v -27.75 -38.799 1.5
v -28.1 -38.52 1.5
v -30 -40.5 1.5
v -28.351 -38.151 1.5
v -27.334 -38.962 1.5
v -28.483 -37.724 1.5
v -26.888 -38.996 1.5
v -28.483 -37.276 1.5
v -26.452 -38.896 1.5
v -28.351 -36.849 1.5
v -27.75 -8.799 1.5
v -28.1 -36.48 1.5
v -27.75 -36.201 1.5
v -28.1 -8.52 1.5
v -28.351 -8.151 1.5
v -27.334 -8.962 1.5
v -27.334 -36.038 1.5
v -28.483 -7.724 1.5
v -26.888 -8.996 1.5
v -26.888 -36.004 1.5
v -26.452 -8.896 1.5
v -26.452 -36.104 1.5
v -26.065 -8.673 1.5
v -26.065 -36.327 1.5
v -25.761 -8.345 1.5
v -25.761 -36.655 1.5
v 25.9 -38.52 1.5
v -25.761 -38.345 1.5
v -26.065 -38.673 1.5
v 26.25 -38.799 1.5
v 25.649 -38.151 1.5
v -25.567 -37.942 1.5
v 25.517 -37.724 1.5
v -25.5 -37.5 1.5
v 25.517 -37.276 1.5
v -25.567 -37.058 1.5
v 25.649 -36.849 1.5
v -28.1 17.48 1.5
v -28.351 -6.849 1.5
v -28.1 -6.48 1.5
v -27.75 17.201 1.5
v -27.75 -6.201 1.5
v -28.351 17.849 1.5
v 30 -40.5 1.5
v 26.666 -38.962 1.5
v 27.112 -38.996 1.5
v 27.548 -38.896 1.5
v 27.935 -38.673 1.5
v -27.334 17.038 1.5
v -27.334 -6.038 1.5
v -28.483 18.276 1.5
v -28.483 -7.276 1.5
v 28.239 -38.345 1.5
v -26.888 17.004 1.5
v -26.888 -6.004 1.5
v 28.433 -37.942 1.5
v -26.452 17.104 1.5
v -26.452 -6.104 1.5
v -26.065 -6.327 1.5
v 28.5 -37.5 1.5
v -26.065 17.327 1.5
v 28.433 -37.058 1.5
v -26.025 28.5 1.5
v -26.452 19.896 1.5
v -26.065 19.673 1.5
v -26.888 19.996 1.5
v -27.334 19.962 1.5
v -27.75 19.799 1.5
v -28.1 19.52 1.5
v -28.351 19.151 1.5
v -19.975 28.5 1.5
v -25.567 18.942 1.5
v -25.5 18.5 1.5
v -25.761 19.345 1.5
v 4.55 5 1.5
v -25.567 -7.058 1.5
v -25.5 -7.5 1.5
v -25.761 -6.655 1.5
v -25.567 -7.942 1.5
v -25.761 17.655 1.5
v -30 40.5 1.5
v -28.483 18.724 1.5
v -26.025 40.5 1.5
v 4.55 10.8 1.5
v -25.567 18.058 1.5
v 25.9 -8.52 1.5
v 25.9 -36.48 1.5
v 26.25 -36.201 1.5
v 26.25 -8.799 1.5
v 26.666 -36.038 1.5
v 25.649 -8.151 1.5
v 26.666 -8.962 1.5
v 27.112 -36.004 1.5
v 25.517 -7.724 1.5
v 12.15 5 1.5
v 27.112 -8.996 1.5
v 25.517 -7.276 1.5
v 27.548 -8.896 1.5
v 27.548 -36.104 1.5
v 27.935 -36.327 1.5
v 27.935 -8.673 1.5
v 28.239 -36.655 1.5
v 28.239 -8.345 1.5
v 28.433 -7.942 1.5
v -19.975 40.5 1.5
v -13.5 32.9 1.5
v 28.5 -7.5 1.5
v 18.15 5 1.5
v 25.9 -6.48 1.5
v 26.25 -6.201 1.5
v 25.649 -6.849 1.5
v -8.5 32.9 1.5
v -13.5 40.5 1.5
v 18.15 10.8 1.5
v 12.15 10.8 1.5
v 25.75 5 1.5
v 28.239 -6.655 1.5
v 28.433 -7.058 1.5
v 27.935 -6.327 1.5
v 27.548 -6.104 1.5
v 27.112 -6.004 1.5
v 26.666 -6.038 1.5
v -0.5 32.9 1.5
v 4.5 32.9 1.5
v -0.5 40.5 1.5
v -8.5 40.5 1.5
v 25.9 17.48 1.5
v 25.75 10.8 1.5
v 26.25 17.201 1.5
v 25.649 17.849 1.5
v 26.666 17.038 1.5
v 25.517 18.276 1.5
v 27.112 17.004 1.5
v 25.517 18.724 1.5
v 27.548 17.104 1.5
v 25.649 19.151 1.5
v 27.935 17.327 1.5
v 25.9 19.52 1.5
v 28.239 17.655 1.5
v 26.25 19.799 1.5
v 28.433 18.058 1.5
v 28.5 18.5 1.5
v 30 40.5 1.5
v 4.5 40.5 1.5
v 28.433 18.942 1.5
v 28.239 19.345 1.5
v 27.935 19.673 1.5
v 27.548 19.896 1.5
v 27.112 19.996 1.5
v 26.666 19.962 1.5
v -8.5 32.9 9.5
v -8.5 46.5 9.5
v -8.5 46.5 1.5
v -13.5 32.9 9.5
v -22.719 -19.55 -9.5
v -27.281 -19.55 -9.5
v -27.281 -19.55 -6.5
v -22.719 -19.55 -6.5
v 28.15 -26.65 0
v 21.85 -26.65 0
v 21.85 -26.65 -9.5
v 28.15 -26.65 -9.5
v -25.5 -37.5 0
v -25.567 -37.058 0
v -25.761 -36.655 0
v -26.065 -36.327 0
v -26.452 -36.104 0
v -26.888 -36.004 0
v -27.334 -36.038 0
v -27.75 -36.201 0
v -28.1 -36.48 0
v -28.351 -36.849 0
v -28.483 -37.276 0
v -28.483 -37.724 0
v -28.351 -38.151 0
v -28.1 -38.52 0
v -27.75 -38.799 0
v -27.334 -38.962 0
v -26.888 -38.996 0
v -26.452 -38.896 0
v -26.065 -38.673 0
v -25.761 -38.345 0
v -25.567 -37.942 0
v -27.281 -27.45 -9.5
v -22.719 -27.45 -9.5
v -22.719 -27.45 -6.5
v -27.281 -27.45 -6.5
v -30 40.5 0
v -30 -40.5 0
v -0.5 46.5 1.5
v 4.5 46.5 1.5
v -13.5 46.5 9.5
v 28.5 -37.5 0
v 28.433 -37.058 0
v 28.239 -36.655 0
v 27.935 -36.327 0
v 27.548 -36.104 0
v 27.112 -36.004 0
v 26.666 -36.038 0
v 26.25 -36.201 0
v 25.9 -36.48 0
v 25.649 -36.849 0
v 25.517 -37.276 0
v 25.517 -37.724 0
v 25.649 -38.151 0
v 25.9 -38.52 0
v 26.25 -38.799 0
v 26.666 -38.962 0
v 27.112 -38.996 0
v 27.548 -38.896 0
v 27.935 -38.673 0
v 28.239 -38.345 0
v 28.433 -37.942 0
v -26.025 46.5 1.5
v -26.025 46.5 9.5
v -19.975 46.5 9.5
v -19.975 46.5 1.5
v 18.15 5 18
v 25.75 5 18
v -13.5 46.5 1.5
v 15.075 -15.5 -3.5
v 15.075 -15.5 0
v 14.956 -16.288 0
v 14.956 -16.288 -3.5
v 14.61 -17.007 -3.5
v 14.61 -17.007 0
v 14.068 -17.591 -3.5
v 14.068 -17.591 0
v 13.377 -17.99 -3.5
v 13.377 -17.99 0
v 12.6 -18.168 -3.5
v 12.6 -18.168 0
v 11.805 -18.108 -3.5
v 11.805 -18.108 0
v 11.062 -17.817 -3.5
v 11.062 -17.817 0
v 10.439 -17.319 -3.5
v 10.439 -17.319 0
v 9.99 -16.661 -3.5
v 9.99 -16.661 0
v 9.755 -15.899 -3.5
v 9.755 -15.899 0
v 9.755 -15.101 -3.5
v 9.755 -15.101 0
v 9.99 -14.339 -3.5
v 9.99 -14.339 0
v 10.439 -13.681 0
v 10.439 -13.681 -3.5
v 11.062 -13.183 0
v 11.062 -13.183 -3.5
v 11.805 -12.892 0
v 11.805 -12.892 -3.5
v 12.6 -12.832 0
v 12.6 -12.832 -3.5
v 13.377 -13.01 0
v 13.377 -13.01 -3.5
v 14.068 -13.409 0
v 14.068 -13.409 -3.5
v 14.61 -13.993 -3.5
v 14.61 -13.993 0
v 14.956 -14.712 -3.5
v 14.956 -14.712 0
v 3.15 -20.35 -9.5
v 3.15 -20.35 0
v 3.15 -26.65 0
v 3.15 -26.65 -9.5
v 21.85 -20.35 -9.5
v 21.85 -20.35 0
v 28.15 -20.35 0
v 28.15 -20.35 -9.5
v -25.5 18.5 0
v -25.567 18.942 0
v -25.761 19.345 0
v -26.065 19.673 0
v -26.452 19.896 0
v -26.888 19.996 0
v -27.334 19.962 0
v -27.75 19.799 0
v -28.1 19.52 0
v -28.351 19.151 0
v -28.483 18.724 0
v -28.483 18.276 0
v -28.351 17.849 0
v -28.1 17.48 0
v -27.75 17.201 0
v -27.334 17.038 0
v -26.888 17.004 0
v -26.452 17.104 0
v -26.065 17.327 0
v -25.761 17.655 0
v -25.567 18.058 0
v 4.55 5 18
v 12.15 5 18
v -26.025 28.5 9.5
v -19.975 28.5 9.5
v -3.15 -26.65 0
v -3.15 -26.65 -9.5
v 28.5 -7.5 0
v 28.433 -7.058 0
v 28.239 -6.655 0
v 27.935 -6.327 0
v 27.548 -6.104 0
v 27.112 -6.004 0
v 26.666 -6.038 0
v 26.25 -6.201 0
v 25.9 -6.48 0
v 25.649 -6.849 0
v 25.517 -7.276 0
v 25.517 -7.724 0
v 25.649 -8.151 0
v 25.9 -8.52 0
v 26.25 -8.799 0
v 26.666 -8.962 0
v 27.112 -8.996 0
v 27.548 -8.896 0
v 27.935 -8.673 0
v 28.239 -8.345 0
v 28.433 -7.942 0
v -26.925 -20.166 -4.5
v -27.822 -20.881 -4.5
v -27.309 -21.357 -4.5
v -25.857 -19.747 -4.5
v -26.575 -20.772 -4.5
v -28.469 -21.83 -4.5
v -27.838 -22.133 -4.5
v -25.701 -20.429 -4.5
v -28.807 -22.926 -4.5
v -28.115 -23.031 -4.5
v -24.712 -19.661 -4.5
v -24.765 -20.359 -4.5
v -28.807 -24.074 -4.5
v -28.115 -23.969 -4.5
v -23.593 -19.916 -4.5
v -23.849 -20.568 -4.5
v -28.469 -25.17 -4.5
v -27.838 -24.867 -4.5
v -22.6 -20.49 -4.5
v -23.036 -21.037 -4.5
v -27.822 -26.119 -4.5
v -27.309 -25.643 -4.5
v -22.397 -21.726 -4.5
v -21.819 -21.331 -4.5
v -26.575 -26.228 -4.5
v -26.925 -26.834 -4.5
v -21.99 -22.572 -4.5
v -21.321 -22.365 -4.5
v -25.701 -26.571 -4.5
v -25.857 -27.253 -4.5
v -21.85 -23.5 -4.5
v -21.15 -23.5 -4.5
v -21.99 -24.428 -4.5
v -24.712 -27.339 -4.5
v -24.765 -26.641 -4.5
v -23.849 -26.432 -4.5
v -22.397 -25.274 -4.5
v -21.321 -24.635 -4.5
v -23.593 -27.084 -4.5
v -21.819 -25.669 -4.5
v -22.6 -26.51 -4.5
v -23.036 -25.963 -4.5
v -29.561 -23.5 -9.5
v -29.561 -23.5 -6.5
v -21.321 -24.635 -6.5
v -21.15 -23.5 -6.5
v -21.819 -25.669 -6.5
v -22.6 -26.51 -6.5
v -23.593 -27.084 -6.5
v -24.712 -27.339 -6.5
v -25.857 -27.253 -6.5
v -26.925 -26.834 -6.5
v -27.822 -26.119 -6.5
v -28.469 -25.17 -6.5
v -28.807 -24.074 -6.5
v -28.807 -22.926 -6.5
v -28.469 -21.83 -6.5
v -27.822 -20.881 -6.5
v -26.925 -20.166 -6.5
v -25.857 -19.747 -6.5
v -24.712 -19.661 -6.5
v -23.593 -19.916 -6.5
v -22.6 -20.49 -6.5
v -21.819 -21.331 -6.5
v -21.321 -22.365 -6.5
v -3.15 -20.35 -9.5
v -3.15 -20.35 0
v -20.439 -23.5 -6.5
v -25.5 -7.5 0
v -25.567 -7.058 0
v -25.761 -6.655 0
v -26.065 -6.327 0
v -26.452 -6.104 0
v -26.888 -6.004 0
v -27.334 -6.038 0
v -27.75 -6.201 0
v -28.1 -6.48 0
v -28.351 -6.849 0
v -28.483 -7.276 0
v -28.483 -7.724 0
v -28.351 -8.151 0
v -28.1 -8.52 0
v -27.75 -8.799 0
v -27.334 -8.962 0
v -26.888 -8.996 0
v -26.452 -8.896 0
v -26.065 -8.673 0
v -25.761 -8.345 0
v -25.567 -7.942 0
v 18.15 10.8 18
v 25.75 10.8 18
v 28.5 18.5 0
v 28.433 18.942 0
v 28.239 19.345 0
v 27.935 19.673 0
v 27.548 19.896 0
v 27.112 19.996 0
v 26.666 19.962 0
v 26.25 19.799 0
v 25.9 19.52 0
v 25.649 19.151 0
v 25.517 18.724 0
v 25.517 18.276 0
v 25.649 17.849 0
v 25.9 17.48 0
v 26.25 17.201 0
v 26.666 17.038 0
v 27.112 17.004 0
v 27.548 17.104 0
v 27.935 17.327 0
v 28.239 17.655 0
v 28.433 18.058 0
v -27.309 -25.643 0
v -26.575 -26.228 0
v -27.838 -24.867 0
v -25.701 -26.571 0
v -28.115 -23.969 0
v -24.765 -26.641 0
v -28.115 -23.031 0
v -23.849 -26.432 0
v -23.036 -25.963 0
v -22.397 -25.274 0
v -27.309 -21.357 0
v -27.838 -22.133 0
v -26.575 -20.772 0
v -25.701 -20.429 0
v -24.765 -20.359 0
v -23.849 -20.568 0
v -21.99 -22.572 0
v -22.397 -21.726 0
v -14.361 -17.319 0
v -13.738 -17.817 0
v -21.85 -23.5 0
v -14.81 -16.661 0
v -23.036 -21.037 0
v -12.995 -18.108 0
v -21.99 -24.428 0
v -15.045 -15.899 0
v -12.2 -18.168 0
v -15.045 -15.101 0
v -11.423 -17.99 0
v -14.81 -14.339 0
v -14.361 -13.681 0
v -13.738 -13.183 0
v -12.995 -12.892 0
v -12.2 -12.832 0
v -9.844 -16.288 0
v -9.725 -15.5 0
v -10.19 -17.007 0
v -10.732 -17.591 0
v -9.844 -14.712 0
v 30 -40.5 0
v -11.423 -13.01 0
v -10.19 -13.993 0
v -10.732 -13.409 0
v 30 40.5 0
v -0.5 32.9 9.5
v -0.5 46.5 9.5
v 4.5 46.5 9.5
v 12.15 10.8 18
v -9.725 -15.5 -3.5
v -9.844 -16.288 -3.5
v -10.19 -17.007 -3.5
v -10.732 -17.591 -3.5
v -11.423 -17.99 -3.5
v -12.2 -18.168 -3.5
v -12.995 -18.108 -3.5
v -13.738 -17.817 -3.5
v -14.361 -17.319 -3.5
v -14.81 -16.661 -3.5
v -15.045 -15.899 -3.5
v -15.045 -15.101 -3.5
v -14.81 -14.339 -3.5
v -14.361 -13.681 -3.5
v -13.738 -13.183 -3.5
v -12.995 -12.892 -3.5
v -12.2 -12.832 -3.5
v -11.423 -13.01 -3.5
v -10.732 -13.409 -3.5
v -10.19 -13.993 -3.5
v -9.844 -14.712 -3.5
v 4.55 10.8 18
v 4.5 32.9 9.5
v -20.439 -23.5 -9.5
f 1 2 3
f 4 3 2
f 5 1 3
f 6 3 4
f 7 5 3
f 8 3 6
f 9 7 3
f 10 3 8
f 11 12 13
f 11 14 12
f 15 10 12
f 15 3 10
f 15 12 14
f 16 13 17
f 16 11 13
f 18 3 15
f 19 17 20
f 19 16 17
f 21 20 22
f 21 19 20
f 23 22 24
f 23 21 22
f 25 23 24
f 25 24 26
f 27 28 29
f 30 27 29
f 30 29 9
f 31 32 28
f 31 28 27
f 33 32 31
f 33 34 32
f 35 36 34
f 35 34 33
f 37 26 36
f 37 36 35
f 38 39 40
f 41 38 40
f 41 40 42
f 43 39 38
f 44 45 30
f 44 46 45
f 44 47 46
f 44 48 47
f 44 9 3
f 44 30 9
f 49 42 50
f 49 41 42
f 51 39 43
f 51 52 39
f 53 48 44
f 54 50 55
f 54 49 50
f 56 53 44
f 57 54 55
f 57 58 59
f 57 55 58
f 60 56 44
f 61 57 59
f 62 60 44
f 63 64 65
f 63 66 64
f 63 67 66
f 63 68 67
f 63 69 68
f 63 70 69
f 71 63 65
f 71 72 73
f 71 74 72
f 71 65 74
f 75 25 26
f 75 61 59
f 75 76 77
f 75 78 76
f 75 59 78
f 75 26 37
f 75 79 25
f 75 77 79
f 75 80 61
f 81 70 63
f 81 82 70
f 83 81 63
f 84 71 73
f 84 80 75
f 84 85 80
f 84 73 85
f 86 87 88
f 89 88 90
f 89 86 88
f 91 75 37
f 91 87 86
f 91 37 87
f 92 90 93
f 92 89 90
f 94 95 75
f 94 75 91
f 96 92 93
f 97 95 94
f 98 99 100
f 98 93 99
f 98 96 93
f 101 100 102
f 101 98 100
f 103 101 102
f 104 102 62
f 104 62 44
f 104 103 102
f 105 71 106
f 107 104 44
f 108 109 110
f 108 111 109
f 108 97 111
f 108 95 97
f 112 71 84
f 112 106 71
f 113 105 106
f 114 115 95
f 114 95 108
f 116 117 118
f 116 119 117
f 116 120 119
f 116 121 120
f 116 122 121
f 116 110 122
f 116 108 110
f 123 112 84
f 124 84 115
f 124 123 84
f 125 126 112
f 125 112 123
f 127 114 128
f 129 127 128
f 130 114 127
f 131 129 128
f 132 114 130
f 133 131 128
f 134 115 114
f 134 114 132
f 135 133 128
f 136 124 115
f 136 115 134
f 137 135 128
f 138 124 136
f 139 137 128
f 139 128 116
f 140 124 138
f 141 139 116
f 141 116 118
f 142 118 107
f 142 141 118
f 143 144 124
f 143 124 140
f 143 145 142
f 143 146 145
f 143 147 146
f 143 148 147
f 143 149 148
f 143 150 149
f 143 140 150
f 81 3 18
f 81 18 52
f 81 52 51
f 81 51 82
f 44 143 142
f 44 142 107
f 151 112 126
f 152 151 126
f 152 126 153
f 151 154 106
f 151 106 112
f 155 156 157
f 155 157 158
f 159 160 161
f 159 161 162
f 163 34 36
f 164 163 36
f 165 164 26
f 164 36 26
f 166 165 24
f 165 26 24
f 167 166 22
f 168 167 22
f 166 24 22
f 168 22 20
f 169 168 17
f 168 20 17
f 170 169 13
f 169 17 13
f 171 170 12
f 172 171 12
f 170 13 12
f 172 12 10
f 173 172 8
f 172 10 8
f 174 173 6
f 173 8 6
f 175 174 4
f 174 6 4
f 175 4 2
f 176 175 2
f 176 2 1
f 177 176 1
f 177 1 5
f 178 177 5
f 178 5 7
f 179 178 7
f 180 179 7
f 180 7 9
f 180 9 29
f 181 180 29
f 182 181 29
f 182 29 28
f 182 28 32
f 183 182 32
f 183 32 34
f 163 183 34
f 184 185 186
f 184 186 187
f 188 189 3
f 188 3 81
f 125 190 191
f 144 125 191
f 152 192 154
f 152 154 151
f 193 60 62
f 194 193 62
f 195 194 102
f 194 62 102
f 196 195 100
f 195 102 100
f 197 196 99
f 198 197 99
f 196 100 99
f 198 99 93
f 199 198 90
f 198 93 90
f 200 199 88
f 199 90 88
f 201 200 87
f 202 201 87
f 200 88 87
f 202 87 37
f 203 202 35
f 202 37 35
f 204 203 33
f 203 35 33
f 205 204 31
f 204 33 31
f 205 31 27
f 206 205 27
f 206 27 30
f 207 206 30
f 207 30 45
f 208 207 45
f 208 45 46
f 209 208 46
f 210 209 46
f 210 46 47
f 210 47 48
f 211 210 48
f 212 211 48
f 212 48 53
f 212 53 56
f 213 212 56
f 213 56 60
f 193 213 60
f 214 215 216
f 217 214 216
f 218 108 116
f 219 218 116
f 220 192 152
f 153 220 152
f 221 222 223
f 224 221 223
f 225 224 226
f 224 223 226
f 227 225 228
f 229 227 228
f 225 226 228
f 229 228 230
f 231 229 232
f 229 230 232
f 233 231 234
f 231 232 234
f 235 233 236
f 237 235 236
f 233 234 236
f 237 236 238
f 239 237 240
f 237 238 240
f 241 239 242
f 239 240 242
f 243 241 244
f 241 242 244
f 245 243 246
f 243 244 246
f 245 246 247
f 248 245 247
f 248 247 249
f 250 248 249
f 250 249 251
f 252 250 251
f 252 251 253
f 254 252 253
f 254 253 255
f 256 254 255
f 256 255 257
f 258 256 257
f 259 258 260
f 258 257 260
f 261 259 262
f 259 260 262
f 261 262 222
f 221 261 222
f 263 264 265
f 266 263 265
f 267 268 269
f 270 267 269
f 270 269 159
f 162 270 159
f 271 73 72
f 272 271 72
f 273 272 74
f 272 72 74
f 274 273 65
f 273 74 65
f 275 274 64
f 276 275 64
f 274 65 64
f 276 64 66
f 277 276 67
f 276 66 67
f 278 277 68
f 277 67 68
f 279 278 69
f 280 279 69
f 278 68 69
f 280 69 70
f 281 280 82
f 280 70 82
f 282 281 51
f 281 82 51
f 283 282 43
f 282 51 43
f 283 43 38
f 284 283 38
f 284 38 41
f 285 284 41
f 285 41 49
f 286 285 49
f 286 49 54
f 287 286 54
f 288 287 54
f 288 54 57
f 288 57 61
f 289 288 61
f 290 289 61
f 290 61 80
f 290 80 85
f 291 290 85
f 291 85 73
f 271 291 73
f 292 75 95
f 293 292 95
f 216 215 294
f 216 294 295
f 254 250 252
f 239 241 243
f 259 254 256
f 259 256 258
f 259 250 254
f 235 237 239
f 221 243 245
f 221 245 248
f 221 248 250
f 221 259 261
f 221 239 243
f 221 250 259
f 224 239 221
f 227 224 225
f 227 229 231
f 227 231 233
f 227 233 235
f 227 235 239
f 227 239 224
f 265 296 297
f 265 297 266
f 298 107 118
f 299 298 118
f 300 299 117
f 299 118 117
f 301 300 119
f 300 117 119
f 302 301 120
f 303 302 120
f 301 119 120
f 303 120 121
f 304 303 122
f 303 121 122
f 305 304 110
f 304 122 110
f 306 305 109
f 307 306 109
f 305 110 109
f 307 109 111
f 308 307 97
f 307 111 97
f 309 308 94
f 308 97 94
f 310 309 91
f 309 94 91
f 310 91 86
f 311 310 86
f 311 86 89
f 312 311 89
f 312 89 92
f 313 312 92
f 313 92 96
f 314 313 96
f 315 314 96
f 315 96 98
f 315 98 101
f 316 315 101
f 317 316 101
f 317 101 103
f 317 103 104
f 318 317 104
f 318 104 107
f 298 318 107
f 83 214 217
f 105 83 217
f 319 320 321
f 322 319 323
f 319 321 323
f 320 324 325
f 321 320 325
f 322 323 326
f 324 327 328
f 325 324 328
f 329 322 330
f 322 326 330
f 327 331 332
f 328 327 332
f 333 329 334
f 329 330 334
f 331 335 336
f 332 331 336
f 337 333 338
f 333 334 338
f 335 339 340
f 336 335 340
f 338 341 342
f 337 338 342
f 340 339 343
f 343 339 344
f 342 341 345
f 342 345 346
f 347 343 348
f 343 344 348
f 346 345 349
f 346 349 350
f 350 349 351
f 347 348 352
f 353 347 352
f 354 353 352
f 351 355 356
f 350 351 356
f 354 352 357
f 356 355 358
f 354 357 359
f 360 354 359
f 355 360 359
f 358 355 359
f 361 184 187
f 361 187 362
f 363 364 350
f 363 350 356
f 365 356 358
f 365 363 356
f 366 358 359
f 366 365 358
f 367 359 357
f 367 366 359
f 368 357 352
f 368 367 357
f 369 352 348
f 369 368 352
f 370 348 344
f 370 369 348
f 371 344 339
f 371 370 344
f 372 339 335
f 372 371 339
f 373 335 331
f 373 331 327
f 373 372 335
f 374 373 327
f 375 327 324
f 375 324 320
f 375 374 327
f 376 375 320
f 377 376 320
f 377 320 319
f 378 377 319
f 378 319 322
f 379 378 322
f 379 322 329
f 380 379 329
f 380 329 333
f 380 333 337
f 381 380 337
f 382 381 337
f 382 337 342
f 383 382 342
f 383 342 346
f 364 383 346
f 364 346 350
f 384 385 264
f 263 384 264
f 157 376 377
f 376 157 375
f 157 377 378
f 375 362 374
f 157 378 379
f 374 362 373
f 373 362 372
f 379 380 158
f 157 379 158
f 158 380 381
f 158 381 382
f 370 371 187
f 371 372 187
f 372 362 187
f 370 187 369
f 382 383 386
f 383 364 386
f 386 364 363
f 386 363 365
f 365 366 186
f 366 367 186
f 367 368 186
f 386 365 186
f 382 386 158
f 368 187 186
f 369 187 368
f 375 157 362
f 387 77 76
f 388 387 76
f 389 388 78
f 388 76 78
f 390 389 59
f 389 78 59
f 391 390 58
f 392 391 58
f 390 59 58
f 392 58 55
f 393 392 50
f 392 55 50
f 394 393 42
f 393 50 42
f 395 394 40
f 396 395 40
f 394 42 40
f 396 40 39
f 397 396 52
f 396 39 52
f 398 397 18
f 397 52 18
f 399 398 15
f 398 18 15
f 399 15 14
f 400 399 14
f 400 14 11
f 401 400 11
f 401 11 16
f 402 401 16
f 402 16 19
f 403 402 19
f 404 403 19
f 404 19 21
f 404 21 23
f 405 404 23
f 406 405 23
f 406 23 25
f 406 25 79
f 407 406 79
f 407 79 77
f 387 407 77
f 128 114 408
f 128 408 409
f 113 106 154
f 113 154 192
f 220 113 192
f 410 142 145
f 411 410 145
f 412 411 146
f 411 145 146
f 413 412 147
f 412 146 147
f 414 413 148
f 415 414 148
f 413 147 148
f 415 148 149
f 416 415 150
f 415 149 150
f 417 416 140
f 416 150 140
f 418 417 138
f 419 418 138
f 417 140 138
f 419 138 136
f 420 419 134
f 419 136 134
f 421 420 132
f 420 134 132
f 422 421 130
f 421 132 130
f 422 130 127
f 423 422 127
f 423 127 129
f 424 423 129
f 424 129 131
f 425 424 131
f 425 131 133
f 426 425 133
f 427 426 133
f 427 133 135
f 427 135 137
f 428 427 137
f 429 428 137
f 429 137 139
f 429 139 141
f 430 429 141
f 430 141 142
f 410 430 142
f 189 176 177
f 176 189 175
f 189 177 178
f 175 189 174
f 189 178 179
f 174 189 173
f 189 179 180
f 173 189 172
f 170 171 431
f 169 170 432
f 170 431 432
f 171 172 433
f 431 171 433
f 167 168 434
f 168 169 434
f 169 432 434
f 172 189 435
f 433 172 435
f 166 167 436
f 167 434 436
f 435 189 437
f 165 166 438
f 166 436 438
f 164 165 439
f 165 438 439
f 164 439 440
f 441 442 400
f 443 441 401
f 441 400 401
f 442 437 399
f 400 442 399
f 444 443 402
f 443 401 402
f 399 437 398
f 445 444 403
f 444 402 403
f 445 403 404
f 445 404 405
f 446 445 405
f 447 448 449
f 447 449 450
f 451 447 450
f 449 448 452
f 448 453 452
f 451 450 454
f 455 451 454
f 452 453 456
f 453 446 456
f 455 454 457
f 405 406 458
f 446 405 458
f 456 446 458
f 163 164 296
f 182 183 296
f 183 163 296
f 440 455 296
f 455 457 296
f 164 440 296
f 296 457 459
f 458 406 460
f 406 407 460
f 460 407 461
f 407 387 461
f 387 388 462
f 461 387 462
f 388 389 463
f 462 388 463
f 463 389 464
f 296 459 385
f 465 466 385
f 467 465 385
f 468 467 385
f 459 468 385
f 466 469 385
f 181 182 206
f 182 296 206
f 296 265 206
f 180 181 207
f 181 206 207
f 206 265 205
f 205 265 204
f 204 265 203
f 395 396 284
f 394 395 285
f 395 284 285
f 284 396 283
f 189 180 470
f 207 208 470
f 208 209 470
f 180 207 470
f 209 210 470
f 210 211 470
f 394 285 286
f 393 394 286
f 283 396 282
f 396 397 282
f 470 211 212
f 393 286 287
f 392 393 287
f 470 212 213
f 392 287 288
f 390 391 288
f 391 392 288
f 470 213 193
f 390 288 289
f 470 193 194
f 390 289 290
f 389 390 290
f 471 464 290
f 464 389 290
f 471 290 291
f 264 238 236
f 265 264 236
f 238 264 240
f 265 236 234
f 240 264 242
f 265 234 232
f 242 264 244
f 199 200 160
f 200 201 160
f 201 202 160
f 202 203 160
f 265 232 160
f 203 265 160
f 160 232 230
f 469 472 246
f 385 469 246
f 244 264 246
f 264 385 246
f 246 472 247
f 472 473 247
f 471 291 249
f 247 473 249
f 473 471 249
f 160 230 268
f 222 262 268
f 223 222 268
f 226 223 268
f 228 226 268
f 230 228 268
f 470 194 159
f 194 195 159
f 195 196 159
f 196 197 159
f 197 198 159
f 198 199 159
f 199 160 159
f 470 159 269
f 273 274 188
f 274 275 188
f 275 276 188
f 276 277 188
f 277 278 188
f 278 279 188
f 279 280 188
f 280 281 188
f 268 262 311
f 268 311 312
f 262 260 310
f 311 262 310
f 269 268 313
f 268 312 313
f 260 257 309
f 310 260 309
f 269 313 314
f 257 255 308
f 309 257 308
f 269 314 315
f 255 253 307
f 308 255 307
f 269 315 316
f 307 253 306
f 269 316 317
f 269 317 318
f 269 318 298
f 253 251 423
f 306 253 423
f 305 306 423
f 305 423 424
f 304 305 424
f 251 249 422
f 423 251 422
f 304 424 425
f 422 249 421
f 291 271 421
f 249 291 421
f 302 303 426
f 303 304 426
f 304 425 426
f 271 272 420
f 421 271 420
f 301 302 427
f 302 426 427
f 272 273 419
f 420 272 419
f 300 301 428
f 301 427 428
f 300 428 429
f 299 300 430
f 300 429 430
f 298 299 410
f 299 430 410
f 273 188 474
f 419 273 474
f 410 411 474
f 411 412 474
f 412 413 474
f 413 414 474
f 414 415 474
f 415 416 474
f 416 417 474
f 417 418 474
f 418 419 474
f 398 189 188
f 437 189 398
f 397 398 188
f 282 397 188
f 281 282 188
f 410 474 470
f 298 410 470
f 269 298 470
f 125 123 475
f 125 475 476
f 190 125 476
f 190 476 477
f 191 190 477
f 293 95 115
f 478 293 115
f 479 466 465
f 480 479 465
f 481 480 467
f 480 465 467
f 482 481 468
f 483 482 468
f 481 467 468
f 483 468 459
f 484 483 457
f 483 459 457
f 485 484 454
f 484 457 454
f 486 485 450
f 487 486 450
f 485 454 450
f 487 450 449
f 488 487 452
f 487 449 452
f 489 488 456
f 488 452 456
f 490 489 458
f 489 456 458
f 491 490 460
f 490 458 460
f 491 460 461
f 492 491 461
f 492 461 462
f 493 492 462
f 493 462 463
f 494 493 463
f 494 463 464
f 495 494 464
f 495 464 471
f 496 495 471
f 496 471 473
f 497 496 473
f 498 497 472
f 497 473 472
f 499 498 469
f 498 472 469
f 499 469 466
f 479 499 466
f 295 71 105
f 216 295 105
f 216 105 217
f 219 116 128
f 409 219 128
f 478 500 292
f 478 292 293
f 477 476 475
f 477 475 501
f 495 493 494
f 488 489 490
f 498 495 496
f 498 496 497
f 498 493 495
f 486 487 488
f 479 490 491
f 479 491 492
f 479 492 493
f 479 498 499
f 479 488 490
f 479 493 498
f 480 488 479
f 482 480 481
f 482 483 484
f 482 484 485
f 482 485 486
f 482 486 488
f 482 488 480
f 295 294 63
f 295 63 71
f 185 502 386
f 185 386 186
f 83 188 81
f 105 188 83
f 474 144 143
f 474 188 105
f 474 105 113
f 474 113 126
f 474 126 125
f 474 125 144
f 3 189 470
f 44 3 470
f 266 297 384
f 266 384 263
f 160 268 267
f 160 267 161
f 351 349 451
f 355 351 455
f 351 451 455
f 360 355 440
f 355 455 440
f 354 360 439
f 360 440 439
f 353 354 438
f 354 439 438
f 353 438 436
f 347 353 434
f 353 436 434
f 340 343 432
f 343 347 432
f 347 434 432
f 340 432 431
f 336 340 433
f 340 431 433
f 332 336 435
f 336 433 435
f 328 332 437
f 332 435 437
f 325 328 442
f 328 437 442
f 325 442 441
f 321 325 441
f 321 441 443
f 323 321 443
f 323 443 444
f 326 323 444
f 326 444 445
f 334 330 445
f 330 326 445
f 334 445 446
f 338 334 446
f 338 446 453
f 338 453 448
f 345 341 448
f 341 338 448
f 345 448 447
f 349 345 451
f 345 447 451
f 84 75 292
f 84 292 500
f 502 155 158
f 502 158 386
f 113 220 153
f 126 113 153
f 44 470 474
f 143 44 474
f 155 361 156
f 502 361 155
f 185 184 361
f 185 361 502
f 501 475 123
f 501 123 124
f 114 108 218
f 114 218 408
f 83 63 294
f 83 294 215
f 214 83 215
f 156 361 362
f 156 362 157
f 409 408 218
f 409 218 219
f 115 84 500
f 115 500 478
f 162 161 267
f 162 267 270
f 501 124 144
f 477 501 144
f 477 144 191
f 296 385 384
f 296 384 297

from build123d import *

# Parameters (mm, degrees)
F0_W      = 60
F0_H      = 81
F1_DEPTH  = 1.5
F2_R      = 1.5
F3_DEPTH  = 1.501
F4_W      = 7.6
F4_H      = 5.8
F5_DEPTH  = 16.5
F6_W      = 5
F6_H      = 13.6
F6_W_2    = 6.05
F6_H_2    = 18
F7_DEPTH  = 8
F8_R      = 3.15
F8_W      = 6.3
F8_H      = 6.3
F9_DEPTH  = 9.5
F10_R     = 2.675
F11_DEPTH = 3.5
F12_R     = 3.85
F12_R_2   = 3.15
F13_DEPTH = 5
F14_R     = 3.85
F15_DEPTH = 3


with BuildPart() as f1:
    # F0 (on Top) → F1 (new body)
    with BuildSketch(Plane.XY):
        Rectangle(F0_W, F0_H)
    extrude(amount=F1_DEPTH)

    # F2 (on face) → F3 (cut, through all)
    with BuildSketch(Plane.XY.offset(1.5)):
        with Locations((-27, -37.5)):
            Circle(F2_R)
        with Locations((-27, -7.5)):
            Circle(F2_R)
        with Locations((-27, 18.5)):
            Circle(F2_R)
        with Locations((27, 18.5)):
            Circle(F2_R)
        with Locations((27, -7.5)):
            Circle(F2_R)
        with Locations((27, -37.5)):
            Circle(F2_R)
    extrude(amount=-F3_DEPTH, mode=Mode.SUBTRACT)

    # F4 (on face) → F5 (join)
    with BuildSketch(Plane.XY.offset(1.5)):
        with Locations((8.35, 7.9)):
            Rectangle(F4_W, F4_H)
        with Locations((21.95, 7.9)):
            Rectangle(F4_W, F4_H)
    extrude(amount=F5_DEPTH)

    # F6 (on face) → F7 (join)
    with BuildSketch(Plane.XY.offset(1.5)):
        with Locations((2, 39.7)):
            Rectangle(F6_W, F6_H)
        with Locations((-11, 39.7)):
            Rectangle(F6_W, F6_H)
        with Locations((-23, 37.5)):
            Rectangle(F6_W_2, F6_H_2)
    extrude(amount=F7_DEPTH)

    # F8 (on face) → F9 (join)
    with BuildSketch(Plane(origin=(0, 0, 0), x_dir=(1, 0, 0), z_dir=(0, 0, -1))):
        with Locations((-25, 23.5)):
            Circle(F8_R)
        with Locations((0, 23.5)):
            Rectangle(F8_W, F8_H)
        with Locations((25, 23.5)):
            Rectangle(F8_W, F8_H)
    extrude(amount=F9_DEPTH)

    # F10 (on face) → F11 (join)
    with BuildSketch(Plane(origin=(0, 0, 0), x_dir=(1, 0, 0), z_dir=(0, 0, -1))):
        with Locations((12.4, 15.5)):
            Circle(F10_R)
        with Locations((-12.4, 15.5)):
            Circle(F10_R)
    extrude(amount=F11_DEPTH)

    # F12 (on face) → F13 (join)
    with BuildSketch(Plane(origin=(0, 0, -9.5), x_dir=(1, 0, 0), z_dir=(0, 0, -1))):
        with Locations((-25, 23.5)):
            Circle(F12_R)
        with Locations((-25, 23.5)):
            Circle(F12_R_2, mode=Mode.SUBTRACT)
        with Locations((-25, 23.5)):
            Circle(F12_R_2)
    extrude(amount=-F13_DEPTH)

    # F14 (on face) → F15 (join)
    with BuildSketch(Plane(origin=(0, 0, -9.5), x_dir=(1, 0, 0), z_dir=(0, 0, -1))):
        Polygon((-27.280534, 19.55), (-22.719466, 19.55), (-20.438933, 23.5), (-22.719466, 27.45), (-27.280534, 27.45), (-29.561067, 23.5), align=None)
        with Locations((-25, 23.5)):
            Circle(F14_R, mode=Mode.SUBTRACT)
        with Locations((-25, 23.5)):
            Circle(F14_R)
    extrude(amount=-F15_DEPTH)


solid = f1.part
